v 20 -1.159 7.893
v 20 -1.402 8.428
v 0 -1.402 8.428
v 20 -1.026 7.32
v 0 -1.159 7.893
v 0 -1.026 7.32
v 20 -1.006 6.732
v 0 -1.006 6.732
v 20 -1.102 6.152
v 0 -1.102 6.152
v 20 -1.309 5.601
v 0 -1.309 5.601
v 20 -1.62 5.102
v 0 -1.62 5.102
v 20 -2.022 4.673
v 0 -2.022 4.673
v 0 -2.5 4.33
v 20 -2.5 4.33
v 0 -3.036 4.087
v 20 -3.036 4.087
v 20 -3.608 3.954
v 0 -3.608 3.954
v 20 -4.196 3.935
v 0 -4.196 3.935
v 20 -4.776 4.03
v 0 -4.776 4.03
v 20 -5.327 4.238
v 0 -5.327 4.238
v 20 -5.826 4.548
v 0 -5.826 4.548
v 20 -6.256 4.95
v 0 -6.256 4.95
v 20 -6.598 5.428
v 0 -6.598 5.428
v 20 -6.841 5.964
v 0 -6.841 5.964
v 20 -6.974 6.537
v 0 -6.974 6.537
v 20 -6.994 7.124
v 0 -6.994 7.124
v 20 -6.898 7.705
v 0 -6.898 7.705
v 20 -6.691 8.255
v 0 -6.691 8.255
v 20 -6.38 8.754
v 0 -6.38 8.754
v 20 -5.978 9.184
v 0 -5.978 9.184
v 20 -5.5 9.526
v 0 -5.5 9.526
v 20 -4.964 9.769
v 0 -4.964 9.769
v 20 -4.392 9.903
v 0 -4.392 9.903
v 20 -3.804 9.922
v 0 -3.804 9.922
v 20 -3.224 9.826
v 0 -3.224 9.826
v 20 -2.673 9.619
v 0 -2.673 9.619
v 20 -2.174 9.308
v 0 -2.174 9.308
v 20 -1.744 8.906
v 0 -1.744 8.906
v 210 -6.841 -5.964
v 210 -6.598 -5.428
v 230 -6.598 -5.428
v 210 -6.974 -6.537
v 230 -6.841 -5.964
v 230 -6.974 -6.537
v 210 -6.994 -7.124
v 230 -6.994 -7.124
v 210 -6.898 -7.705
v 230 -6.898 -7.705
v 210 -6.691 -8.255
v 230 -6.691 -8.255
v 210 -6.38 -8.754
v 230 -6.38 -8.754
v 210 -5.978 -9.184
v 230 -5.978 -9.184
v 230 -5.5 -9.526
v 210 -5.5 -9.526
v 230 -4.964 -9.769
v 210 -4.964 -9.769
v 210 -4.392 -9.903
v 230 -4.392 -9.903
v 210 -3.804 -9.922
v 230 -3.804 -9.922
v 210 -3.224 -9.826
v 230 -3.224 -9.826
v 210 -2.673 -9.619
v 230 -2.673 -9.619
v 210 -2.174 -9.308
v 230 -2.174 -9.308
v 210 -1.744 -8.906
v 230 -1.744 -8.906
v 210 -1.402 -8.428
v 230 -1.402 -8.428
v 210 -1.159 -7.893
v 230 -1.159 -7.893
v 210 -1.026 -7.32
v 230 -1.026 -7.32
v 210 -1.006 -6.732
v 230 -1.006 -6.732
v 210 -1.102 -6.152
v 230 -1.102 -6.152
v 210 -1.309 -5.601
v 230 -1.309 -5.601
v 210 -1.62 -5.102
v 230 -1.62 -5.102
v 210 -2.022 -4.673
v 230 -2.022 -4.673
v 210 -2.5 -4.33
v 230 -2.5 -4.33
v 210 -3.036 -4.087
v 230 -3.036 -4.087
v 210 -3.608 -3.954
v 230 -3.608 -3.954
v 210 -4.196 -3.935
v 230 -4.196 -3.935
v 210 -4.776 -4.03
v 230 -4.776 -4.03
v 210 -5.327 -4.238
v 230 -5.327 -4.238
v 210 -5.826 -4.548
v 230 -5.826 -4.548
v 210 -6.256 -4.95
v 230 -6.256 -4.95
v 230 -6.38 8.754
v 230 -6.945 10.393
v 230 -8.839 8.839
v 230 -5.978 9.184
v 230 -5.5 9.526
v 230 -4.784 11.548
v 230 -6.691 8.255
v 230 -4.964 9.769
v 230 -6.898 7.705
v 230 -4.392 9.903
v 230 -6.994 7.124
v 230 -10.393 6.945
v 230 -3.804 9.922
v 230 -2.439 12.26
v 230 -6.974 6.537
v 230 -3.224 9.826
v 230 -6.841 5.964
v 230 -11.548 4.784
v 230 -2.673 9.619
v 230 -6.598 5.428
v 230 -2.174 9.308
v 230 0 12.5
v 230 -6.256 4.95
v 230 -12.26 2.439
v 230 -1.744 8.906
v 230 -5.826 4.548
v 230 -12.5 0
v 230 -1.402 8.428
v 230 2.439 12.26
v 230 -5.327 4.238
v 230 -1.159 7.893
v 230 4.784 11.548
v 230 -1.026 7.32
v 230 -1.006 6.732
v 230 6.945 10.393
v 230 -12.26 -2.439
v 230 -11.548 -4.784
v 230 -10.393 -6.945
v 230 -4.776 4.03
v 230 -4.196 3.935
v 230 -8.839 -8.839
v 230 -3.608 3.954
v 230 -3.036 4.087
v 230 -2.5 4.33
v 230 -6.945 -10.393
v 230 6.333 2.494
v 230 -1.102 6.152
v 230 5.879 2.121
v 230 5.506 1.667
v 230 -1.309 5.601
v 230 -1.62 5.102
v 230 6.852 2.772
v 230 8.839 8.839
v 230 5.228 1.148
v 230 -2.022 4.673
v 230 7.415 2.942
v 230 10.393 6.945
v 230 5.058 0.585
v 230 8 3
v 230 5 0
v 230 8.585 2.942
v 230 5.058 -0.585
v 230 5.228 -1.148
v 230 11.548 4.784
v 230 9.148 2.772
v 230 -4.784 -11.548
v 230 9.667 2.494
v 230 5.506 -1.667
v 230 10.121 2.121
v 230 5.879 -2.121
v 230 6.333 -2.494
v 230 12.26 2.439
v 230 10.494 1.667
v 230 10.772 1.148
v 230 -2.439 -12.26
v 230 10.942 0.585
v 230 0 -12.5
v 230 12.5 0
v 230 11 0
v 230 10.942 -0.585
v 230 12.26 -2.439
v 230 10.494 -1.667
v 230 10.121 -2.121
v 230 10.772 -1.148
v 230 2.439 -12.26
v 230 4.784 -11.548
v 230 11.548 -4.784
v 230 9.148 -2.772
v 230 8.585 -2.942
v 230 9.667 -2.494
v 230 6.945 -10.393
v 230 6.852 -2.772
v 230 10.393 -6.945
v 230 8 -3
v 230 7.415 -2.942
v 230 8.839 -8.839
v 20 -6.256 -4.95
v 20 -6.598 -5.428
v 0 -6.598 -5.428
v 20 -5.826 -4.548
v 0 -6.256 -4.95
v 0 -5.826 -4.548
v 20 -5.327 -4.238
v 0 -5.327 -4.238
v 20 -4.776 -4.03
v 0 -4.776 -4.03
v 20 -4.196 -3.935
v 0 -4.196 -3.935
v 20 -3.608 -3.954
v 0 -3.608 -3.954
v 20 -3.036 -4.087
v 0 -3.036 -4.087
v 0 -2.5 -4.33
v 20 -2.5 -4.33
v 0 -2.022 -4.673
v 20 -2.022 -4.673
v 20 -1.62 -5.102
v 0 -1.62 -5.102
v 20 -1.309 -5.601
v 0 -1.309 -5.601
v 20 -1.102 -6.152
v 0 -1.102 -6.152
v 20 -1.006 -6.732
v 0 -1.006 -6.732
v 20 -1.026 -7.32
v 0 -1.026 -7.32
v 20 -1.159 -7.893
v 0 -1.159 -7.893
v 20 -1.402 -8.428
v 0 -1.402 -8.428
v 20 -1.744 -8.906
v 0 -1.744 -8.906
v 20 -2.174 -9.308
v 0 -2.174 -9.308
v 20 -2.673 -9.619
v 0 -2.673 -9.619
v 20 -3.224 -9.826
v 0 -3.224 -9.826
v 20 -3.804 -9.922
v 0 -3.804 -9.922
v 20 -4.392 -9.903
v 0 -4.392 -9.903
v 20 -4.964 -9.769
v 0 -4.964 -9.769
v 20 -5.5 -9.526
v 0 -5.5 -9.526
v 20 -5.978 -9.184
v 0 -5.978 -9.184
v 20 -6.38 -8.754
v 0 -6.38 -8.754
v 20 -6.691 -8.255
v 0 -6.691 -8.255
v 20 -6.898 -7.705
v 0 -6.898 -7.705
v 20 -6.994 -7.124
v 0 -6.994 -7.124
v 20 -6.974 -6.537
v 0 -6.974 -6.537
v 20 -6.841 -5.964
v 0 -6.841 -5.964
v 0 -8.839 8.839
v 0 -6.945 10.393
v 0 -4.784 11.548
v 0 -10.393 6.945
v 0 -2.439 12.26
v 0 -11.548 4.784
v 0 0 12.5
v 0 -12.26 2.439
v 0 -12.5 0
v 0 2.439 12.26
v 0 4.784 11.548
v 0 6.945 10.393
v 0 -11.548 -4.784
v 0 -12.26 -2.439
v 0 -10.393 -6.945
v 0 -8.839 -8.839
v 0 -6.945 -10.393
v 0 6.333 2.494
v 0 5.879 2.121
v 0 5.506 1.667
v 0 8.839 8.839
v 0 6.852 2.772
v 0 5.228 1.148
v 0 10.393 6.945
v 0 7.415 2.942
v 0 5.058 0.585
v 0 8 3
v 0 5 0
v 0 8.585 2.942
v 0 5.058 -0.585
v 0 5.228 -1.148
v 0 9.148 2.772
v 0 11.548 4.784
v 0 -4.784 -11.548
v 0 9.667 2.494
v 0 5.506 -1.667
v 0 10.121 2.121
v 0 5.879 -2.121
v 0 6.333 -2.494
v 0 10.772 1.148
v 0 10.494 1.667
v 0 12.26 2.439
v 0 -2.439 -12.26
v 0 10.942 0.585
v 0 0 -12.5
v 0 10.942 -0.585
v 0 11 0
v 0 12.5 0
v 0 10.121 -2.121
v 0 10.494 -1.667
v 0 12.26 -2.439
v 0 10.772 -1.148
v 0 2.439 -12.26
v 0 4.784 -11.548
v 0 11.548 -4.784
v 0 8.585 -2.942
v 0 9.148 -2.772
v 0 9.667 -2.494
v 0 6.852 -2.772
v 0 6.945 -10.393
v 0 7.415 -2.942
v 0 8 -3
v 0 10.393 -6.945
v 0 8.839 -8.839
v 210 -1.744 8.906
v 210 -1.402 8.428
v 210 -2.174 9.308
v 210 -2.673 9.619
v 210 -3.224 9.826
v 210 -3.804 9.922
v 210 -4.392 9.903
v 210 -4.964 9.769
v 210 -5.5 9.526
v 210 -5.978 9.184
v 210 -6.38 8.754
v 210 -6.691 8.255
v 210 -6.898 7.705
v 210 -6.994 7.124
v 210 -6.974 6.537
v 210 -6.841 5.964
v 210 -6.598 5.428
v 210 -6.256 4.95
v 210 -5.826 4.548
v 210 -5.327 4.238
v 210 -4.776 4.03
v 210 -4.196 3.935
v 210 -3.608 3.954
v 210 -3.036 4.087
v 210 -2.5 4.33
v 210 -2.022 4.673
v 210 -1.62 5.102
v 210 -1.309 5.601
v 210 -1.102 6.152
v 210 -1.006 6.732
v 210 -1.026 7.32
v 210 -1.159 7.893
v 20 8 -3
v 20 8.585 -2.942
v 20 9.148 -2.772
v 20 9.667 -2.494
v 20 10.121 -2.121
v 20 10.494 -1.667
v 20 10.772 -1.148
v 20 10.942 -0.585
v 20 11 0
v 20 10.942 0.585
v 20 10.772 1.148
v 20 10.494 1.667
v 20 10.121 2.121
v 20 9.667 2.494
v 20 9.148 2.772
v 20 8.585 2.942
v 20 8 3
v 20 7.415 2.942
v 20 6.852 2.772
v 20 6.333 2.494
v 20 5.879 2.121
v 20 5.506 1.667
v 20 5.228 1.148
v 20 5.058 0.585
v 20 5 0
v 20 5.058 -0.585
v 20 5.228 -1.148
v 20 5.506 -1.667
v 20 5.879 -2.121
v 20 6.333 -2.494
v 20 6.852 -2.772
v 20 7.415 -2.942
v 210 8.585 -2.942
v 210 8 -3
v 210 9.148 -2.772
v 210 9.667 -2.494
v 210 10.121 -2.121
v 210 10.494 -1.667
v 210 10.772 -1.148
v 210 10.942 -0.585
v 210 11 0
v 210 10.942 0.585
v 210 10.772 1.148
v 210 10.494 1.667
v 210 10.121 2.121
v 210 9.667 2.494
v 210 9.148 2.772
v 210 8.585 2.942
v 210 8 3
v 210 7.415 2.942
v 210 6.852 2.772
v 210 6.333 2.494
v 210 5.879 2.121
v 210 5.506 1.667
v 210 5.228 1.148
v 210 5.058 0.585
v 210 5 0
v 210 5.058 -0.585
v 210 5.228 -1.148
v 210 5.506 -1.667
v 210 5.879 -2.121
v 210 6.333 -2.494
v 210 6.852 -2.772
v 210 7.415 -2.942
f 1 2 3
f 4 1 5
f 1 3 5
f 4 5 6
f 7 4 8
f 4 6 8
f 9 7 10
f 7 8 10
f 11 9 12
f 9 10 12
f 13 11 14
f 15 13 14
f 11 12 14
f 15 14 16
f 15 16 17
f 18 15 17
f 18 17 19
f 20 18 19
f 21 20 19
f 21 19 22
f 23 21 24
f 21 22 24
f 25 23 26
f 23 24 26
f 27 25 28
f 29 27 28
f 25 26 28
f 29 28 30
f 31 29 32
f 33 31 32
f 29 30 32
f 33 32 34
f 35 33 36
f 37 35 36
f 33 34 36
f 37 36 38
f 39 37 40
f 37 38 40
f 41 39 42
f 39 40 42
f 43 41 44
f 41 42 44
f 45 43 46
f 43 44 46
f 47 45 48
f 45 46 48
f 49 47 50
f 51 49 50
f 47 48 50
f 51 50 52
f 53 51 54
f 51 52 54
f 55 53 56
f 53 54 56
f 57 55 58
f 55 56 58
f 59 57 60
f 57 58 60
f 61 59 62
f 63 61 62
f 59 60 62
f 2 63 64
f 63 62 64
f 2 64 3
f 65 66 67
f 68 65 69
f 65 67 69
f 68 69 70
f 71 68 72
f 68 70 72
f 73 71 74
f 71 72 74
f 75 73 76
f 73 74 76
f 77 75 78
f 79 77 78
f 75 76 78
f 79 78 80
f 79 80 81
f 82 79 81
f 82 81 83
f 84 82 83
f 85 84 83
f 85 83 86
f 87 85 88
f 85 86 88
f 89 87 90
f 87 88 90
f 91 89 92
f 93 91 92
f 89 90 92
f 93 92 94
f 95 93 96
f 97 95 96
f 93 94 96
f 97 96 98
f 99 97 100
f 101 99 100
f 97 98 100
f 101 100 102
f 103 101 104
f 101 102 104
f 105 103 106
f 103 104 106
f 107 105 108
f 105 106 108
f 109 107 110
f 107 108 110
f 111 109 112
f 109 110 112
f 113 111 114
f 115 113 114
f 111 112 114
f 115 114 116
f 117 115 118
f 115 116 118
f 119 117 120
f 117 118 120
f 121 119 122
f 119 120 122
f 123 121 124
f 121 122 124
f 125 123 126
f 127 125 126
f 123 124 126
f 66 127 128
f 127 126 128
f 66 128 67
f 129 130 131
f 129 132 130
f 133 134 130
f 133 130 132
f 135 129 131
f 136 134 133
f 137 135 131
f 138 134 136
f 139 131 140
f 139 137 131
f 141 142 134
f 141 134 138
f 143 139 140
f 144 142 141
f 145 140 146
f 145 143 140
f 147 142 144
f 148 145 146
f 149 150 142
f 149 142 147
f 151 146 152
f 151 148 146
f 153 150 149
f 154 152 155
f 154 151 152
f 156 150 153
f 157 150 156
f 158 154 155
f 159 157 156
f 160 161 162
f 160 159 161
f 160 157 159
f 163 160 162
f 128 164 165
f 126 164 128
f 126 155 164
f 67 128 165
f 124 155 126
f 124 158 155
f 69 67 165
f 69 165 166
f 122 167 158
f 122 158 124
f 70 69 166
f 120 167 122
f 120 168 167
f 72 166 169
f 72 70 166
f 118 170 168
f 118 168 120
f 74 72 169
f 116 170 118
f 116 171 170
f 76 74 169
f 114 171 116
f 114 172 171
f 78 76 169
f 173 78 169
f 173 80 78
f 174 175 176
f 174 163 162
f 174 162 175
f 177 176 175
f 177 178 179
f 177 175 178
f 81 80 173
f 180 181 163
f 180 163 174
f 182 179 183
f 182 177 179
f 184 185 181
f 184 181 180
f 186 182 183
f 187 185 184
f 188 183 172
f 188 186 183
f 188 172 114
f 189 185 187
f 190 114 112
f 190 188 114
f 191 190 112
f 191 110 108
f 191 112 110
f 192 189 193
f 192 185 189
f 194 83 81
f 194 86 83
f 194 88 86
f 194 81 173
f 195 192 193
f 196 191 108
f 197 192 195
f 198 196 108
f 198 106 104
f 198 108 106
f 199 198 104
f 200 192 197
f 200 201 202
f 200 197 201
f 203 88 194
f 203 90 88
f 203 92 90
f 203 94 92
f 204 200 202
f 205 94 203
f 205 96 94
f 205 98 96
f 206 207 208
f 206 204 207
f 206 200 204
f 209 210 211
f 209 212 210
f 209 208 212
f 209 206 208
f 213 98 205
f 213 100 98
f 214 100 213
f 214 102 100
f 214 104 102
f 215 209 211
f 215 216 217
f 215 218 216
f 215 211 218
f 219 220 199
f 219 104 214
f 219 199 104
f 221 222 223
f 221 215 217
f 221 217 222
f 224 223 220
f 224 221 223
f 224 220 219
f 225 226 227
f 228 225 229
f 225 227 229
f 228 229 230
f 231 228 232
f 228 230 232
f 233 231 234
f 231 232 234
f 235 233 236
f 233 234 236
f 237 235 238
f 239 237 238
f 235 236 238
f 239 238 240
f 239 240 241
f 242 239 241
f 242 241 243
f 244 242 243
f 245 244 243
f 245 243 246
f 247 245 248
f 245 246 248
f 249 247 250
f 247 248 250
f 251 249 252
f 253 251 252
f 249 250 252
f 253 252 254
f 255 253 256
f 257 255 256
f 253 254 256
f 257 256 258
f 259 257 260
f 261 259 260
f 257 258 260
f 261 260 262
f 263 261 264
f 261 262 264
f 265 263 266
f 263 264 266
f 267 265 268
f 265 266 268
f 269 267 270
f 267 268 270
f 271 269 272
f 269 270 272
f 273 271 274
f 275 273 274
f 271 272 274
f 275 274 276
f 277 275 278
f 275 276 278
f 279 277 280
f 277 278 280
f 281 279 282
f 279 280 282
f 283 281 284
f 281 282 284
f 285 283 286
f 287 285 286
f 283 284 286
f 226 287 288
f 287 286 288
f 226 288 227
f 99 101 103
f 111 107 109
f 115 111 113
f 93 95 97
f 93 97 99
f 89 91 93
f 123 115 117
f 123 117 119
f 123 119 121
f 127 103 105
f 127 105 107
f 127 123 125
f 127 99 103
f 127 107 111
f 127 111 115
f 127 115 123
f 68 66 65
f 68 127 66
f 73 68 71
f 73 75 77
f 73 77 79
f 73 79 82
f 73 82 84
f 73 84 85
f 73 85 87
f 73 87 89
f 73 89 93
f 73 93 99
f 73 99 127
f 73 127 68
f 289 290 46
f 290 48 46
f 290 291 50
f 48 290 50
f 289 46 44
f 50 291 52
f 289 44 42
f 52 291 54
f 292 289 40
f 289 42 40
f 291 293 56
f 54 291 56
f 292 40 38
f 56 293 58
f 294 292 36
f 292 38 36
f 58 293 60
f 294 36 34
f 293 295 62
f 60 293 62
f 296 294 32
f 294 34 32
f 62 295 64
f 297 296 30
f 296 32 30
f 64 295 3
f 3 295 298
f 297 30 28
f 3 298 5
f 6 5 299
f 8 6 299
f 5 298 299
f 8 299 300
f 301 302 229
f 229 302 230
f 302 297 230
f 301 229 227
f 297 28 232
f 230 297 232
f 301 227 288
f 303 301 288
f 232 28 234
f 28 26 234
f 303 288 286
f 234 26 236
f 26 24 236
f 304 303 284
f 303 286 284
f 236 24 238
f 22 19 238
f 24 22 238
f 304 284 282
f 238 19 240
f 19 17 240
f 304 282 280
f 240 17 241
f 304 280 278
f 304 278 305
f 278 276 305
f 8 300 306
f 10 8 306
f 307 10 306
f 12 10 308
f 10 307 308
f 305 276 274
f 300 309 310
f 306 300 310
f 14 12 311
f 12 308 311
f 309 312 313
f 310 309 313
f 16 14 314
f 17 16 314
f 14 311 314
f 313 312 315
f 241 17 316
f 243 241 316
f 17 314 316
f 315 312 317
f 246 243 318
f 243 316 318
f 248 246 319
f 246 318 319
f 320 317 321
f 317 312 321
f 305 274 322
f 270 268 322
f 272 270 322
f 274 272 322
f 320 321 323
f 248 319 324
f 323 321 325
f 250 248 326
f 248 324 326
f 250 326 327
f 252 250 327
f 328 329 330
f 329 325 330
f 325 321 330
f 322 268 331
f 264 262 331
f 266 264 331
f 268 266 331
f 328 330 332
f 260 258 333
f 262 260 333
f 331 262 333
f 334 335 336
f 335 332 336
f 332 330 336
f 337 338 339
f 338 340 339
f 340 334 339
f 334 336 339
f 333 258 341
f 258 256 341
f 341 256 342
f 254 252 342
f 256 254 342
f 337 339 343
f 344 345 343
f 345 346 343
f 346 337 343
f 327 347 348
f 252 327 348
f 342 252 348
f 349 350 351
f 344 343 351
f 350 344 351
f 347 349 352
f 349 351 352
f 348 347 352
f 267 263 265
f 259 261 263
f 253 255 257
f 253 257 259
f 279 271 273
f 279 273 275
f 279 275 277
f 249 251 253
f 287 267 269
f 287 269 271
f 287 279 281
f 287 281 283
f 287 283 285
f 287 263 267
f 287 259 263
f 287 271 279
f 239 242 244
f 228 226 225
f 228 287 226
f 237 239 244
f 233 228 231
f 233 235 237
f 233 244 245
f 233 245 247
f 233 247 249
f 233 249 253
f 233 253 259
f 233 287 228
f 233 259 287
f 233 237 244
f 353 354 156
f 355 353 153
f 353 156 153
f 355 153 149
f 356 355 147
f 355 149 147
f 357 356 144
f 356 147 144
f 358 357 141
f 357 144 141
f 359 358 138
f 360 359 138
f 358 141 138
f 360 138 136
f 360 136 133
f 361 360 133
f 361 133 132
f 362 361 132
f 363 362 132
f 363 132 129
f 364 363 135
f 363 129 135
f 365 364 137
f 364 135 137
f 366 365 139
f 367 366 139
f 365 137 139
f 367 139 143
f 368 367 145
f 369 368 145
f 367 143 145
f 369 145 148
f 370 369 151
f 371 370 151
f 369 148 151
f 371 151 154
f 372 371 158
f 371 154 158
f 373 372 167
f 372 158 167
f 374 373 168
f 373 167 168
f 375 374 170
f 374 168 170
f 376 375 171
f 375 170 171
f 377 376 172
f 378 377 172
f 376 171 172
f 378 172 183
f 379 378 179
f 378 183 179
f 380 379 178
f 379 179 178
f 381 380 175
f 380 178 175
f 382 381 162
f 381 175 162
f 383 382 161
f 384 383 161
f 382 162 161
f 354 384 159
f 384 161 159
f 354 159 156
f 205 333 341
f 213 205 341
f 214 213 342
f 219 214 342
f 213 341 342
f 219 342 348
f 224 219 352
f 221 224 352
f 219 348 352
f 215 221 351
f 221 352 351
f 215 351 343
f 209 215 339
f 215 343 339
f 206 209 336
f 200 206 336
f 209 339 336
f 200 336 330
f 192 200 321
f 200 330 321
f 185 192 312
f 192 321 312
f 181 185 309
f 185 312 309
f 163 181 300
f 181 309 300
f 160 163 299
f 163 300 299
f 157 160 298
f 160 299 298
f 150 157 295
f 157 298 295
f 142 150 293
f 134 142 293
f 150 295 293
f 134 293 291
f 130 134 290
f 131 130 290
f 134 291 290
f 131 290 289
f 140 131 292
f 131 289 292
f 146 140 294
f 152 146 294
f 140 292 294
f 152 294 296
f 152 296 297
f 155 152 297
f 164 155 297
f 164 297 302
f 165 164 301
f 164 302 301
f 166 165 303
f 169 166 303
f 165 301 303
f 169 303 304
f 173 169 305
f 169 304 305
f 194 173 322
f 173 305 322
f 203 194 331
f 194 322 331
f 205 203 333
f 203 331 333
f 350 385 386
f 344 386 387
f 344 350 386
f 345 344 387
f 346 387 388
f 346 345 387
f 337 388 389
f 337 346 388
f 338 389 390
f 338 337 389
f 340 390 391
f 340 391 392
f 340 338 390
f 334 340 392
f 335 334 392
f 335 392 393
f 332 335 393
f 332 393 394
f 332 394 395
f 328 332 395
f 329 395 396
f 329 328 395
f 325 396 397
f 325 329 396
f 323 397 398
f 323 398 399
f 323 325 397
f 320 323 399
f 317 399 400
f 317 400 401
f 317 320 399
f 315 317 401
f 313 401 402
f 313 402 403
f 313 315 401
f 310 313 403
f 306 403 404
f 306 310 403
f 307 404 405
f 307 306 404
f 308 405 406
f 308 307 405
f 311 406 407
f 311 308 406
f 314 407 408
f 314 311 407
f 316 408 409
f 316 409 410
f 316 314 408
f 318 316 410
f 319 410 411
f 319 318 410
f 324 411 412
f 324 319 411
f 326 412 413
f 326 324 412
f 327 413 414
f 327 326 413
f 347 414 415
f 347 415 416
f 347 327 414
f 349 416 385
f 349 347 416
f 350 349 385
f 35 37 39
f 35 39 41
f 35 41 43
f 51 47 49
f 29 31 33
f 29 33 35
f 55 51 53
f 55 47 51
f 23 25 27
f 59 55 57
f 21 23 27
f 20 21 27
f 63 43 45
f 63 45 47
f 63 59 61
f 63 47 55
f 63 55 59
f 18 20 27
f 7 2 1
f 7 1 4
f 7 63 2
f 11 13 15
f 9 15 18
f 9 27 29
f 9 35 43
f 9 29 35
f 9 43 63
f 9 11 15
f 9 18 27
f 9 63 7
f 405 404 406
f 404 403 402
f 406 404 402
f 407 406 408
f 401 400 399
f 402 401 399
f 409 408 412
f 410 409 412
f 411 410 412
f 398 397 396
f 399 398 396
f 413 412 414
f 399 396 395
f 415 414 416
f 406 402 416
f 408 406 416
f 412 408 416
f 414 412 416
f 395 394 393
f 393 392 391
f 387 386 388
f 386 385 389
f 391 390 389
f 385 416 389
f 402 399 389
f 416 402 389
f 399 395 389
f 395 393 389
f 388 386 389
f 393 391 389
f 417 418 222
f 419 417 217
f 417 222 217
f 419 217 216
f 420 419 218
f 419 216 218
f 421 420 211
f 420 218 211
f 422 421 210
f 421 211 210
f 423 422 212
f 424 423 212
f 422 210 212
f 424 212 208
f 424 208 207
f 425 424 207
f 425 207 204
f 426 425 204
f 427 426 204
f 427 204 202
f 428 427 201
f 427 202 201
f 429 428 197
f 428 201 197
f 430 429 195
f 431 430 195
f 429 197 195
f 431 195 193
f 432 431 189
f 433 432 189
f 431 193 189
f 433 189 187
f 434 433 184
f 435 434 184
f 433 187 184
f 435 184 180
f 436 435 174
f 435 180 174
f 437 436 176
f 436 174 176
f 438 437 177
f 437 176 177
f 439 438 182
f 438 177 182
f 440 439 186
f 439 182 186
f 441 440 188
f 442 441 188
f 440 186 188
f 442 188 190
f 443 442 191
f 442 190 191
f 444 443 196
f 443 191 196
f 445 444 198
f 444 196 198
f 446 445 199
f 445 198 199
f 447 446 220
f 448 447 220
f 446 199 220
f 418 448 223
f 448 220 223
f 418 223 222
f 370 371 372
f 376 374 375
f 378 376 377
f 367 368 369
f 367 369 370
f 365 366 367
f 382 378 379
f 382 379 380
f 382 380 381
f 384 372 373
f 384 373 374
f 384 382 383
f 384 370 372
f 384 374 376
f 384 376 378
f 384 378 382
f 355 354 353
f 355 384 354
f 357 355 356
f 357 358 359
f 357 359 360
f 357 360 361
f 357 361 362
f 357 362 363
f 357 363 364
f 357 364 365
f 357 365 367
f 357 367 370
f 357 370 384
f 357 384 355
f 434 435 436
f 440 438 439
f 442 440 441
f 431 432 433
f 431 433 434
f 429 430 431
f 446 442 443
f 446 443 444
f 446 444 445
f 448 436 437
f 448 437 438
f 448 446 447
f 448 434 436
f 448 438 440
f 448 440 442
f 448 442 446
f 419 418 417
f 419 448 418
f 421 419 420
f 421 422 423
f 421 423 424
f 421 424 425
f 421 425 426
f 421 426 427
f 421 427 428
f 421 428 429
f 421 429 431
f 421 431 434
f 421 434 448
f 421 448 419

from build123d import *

# Parameters (mm, degrees)
SKETCH_1_R               = 12.5
EXTRUDE_1_DEPTH          = 230
SKETCH_2_R               = 3
CUT_EXTRUDE_1_DEPTH      = 20
PATTERN_CIRCULAR_1_COUNT = 3
MIRROR_1_COPY_1_SKETCH_R = 3
MIRROR_1_COPY_1_DEPTH    = 20
MIRROR_1_COPY_2_SKETCH_R = 3
MIRROR_1_COPY_2_DEPTH    = 20


with BuildPart() as part:
    # 草图1 → 凸台-拉伸1 (new body)
    with BuildSketch(Plane(origin=(0, 0, 0), x_dir=(0, 0, -1), z_dir=(1, 0, 0))):
        Circle(SKETCH_1_R)
    extrude(amount=EXTRUDE_1_DEPTH)

    # 草图2 → 切除-拉伸1 (cut)
    with BuildSketch(Plane(origin=(230, 0, 0), x_dir=(0, 0, -1), z_dir=(1, 0, 0))):
        with Locations((0, 8)):
            Circle(SKETCH_2_R)
    cut_extrude_1 = extrude(amount=-CUT_EXTRUDE_1_DEPTH, mode=Mode.SUBTRACT)

    # 阵列(圆周)1: 切除-拉伸1 ×3 about axis
    pattern_circular_1_axis = Axis((0, 0, 0), (1, 0, 0))
    for i in range(1, PATTERN_CIRCULAR_1_COUNT):
        add(cut_extrude_1.rotate(pattern_circular_1_axis, i * 360 / PATTERN_CIRCULAR_1_COUNT), mode=Mode.SUBTRACT)

    # 镜向1: 切除-拉伸1 across plane
    add(cut_extrude_1.mirror(Plane(origin=(115, 0, 0), x_dir=(0, 0, 1), z_dir=(1, 0, 0))), mode=Mode.SUBTRACT)

    # 镜向1 copy 1 sketch → 镜向1 copy 1 (cut)
    with BuildSketch(Plane(origin=(0, 0, 0), x_dir=(0, 0.8660254037844387, 0.4999999999999998), z_dir=(-1, 0, 0))):
        with Locations((0, -8)):
            Circle(MIRROR_1_COPY_1_SKETCH_R)
    extrude(amount=-MIRROR_1_COPY_1_DEPTH, mode=Mode.SUBTRACT)

    # 镜向1 copy 2 sketch → 镜向1 copy 2 (cut)
    with BuildSketch(Plane(origin=(0, 0, 0), x_dir=(0, -0.8660254037844384, 0.5000000000000004), z_dir=(-1, 0, 0))):
        with Locations((0, -8)):
            Circle(MIRROR_1_COPY_2_SKETCH_R)
    extrude(amount=-MIRROR_1_COPY_2_DEPTH, mode=Mode.SUBTRACT)


solid = part.part
